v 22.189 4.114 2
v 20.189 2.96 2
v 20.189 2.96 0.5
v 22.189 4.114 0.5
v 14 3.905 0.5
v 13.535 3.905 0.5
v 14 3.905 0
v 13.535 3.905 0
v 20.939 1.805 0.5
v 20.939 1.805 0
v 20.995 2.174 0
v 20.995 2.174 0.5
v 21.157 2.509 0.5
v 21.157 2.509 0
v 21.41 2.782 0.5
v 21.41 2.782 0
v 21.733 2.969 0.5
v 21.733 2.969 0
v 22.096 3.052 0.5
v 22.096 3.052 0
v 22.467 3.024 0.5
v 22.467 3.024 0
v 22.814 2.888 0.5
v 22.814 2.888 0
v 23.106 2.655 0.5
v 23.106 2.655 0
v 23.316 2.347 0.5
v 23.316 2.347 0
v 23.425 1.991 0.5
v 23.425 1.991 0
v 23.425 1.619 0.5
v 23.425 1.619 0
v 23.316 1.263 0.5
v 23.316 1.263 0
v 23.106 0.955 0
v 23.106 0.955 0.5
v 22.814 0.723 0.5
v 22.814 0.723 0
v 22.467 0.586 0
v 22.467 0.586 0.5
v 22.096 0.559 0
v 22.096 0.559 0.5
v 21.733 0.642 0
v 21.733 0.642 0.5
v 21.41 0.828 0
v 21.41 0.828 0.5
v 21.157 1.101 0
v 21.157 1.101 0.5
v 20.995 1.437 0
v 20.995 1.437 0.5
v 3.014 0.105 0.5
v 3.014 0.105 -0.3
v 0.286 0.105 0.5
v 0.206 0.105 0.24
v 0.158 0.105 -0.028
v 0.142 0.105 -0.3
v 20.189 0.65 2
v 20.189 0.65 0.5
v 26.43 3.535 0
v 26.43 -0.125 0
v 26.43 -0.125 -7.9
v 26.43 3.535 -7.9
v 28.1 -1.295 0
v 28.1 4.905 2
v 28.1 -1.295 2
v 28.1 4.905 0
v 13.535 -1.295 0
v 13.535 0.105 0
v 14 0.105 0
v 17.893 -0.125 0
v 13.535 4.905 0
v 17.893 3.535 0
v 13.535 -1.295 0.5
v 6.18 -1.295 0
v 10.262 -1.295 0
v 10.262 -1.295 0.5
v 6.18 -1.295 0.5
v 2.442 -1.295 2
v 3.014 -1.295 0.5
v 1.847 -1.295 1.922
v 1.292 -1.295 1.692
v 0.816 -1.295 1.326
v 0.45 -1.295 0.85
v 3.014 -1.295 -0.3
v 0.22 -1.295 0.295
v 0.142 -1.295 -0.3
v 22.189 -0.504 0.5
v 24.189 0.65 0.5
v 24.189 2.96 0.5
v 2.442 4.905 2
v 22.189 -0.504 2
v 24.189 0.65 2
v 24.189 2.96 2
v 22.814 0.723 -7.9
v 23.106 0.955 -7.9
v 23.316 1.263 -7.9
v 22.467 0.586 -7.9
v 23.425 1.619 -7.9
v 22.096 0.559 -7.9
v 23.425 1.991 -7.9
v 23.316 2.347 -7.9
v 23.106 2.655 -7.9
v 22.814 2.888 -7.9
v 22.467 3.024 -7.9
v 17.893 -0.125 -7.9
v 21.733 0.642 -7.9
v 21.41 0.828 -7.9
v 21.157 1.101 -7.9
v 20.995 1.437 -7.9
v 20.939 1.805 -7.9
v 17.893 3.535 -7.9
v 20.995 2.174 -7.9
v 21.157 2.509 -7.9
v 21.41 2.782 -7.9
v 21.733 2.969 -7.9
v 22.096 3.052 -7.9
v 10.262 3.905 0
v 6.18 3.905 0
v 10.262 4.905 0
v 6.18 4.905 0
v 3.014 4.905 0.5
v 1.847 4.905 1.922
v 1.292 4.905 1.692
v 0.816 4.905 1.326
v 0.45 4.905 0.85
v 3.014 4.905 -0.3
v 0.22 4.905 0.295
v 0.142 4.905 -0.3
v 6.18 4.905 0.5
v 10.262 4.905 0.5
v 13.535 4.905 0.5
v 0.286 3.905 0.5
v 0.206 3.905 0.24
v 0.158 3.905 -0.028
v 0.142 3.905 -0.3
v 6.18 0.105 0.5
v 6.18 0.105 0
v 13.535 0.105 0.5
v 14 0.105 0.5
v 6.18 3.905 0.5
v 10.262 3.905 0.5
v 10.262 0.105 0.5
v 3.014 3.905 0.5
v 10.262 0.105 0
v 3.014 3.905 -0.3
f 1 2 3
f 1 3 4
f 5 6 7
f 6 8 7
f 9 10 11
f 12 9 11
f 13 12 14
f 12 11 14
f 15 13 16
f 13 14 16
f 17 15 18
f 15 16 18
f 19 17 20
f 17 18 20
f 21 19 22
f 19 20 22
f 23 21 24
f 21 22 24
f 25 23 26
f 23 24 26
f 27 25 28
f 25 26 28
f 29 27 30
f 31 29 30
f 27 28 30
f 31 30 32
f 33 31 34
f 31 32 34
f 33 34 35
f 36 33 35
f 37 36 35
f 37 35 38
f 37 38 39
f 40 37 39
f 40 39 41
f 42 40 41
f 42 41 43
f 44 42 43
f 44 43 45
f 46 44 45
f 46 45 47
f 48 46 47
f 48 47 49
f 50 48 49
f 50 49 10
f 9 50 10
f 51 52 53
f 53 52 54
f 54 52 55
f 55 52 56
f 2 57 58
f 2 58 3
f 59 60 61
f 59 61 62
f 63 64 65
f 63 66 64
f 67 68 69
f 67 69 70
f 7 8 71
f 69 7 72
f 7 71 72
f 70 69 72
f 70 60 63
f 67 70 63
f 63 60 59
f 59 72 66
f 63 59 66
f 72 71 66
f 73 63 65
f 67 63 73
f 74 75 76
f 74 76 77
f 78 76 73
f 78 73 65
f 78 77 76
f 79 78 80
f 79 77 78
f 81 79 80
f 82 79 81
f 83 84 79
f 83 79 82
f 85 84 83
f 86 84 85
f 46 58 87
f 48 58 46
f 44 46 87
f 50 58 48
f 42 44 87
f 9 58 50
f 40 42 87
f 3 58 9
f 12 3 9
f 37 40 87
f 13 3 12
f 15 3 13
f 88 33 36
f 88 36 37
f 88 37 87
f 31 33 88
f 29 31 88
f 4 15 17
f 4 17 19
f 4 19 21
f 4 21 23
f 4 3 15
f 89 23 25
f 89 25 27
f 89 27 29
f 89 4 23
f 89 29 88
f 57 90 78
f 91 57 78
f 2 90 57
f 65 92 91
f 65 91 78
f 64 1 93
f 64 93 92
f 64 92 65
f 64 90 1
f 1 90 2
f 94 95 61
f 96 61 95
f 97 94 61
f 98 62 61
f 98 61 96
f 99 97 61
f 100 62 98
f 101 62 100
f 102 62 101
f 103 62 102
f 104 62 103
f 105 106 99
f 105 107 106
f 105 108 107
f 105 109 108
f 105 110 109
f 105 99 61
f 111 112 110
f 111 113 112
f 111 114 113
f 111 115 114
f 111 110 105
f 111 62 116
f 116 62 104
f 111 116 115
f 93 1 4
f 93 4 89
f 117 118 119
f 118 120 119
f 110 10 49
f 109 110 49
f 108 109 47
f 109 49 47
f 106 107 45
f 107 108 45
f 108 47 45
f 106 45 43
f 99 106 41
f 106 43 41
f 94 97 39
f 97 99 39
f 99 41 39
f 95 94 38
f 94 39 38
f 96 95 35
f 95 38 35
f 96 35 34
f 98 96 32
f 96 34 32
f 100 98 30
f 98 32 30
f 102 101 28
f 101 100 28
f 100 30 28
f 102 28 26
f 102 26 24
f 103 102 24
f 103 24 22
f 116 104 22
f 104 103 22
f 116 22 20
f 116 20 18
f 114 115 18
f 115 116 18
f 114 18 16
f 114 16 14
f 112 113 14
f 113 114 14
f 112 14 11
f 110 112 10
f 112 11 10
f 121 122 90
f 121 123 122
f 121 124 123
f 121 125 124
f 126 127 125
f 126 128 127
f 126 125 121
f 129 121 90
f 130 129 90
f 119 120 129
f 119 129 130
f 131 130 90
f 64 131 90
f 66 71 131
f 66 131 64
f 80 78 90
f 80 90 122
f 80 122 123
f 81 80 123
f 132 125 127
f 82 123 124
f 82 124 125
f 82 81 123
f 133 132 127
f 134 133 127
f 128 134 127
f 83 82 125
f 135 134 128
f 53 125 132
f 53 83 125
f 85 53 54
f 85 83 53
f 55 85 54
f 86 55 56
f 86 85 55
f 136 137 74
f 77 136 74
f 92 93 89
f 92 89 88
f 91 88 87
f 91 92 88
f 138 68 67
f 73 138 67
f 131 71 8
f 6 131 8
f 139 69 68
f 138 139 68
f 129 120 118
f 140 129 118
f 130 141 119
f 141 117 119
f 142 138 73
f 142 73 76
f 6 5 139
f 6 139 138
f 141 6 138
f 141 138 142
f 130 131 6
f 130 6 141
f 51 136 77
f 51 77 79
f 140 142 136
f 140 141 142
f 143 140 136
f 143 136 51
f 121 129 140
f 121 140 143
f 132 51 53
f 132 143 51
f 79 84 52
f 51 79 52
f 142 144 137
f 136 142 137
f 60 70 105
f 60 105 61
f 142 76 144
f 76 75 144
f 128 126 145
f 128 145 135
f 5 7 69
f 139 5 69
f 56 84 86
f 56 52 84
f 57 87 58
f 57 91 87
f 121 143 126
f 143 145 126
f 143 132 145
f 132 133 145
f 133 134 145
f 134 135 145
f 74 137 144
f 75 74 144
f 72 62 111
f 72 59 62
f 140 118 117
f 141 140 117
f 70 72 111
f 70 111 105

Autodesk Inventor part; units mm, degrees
ref_plane "YZ Plane" through (0, 0, 0) normal (1, 0, 0) x (0, 1, 0)
ref_plane "XZ Plane" through (0, 0, 0) normal (0, 1, 0) x (-1, 0, 0)
ref_plane "XY Plane" through (0, 0, 0) normal (0, 0, 1) x (1, 0, 0)
sketch "Sketch1" plane through (0, 0, 0) normal (0, 0, 1) x (1, 0, 0)
  line L0 (0.142, 0.105) -> (28.1, 0.105)
  line L1 (28.1, -1.295) -> (0.142, -1.295)
  line L2 (0.142, -1.295) -> (0.142, 0.105)
  line L3 (28.1, -1.295) -> (28.1, 0.105)
  line L4 (0.142, -1.295) -> (0.142, 0.105)
  line L5 (10.2623, 4.905) -> (13.5348, 4.905) projected
  line L6 (6.1805, 3.905) -> (10.2623, 3.905) projected
  line L7 (10.2623, 0.105) -> (6.1805, 0.105) projected
  line L8 (0.142, 4.905) -> (28.1, 4.905)
  line L9 (28.1, 4.905) -> (28.1, 3.905)
  line L10 (28.1, 3.905) -> (0.142, 3.905)
  line L11 (0.142, 3.905) -> (0.142, 4.905)
  line L12 (0.142, -1.295) -> (0.142, 0.105)
  line L13 (28.1, 3.905) -> (28.1, 0.105)
  line L14 (0.142, 3.905) -> (0.142, 0.105)
  line L15 (3.1, -1.295) -> (29.6, -1.295) projected
  line L16 (0.142, -1.295) -> (0.142, 0.105) projected
extrude "side" add sketch "Sketch1" along normal blind 2
sketch "Sketch2" plane through (0, 0, 0) normal (0, 0, -1) x (-1, 0, 0)
  line L0 (-26.6, -0.295) -> (-17.7228, -0.295) projected
  circle A0 centre (-22.1893, 1.8051) radius 1.1 projected
  line L1 (-26.6, -0.295) -> (-17.7228, -0.295) projected
  line L2 (-26.6, 3.705) -> (-26.6, -0.295) projected
  line L3 (-17.7228, 3.705) -> (-26.6, 3.705) projected
  line L4 (-17.8928, -0.125) -> (-26.43, -0.125)
  line L5 (-26.43, -0.125) -> (-26.43, 3.535)
  line L6 (-26.43, 3.535) -> (-17.8928, 3.535)
  circle A1 centre (-22.1893, 1.8051) radius 1.25
  line L7 (-17.8928, 3.535) -> (-17.8928, -0.125)
  line L8 (-17.7228, -0.295) -> (-17.7228, 3.905) projected
  point P0 (0, 0)
  dimension "d2" = 0.17
  dimension "d4" = 0.17
  dimension "d5" = 0.17
  dimension "d6" = 2.5
  dimension "d25" = 0.17
extrude "sliding_block" add sketch "Sketch2" along normal blind 7.9 contours L4 L5 L6 L7
sketch "Sketch3" plane through (22.1893, 1.8051, 0) normal (0, 0, -1) x (-1, 0, 0)
  circle A0 centre (0, 0) radius 1.25 projected
  point P0 (22.1893, -1.8051)
extrude "hole" cut sketch "Sketch3" against normal up to surface (2 mm away)
sketch "Sketch4" plane through (0, 0, 0) normal (0, 0, -1) x (-1, 0, 0)
  line L0 (-3.0135, 4.905) -> (-6.1805, 4.905) projected
  line L1 (-3.0135, 3.905) -> (-3.0135, 4.905) projected
  line L2 (-0.3963, 3.905) -> (-3.0135, 3.905) projected
  line L3 (-3.0135, 0.105) -> (-0.3963, 0.105) projected
  line L4 (-3.0135, -1.295) -> (-3.0135, 0.105) projected
  line L5 (-6.1805, -1.295) -> (-3.0135, -1.295) projected
  line L6 (-6.1805, 0.105) -> (-6.1805, -1.295) projected
  line L7 (-10.2623, 0.105) -> (-6.1805, 0.105) projected
  line L8 (-10.2623, -1.295) -> (-10.2623, 0.105) projected
  line L9 (-13.5348, -1.295) -> (-10.2623, -1.295) projected
  line L10 (-13.5348, 0.105) -> (-13.5348, -1.295) projected
  line L11 (-14, 0.105) -> (-13.5348, 0.105) projected
  line L12 (-14, 3.905) -> (-14, 0.105) projected
  line L13 (-13.5348, 3.905) -> (-14, 3.905) projected
  line L14 (-13.5348, 4.905) -> (-13.5348, 3.905) projected
  line L15 (-10.2623, 4.905) -> (-13.5348, 4.905) projected
  line L16 (-10.2623, 3.905) -> (-10.2623, 4.905) projected
  line L17 (-6.1805, 3.905) -> (-10.2623, 3.905) projected
  line L18 (-6.1805, 4.905) -> (-6.1805, 3.905) projected
  line L19 (-6.1805, -1.295) -> (-3.0135, -1.295) projected
  line L20 (-6.1805, 0.105) -> (-6.1805, -1.295) projected
  line L21 (-10.2623, 0.105) -> (-6.1805, 0.105) projected
  line L22 (-10.2623, -1.295) -> (-10.2623, 0.105) projected
  line L23 (-13.5348, -1.295) -> (-10.2623, -1.295) projected
  line L24 (-13.5348, 0.105) -> (-13.5348, -1.295) projected
  line L25 (-14, 0.105) -> (-13.5348, 0.105) projected
  line L26 (-14, 3.905) -> (-14, 0.105) projected
  line L27 (-13.5348, 3.905) -> (-14, 3.905) projected
  line L28 (-13.5348, 4.905) -> (-13.5348, 3.905) projected
  line L29 (-10.2623, 4.905) -> (-13.5348, 4.905) projected
  line L30 (-10.2623, 3.905) -> (-10.2623, 4.905) projected
  line L31 (-6.1805, 3.905) -> (-10.2623, 3.905) projected
  line L32 (-6.1805, 4.905) -> (-6.1805, 3.905) projected
  line L33 (-3.0135, 4.905) -> (-6.1805, 4.905) projected
  line L34 (-3.0135, 3.905) -> (-3.0135, 4.905) projected
  line L35 (-0.3963, 3.905) -> (-3.0135, 3.905) projected
  line L36 (-0.3963, 0.105) -> (-0.3963, 3.905) projected
  line L37 (-3.0135, 0.105) -> (-0.3963, 0.105) projected
  line L38 (-3.0135, -1.295) -> (-3.0135, 0.105) projected
  line L39 (-0.3963, 0.105) -> (-0.142, 0.105)
  line L40 (-0.142, 4.905) -> (-0.142, -1.295) projected
  line L41 (-0.3963, 3.905) -> (-0.142, 3.905)
  line L42 (-0.142, 3.905) -> (-0.142, 0.105)
extrude "alignment_cut" cut sketch "Sketch4" against normal blind 0.5
sketch "Sketch5" plane through (0, 0, 2) normal (0, 0, 1) x (1, 0, 0)
  line L0 (22.1893, 4.1145) -> (24.1893, 2.9598)
  line L1 (24.1893, 2.9598) -> (24.1893, 0.6504)
  line L2 (24.1893, 0.6504) -> (22.1893, -0.5043)
  line L3 (22.1893, -0.5043) -> (20.1893, 0.6504)
  line L4 (20.1893, 0.6504) -> (20.1893, 2.9598)
  line L5 (20.1893, 2.9598) -> (22.1893, 4.1145)
  circle A0 centre (22.1893, 1.8051) radius 1.25 projected
  point P0 (0, 0)
  dimension "d19" = 4
sketch "Sketch6" plane through (0, 0, 0) normal (0, 0, -1) x (-1, 0, 0)
  line L0 (-0.142, -1.295) -> (-28.1, -1.295) projected
  line L1 (-0.142, -1.295) -> (-28.1, -1.295) projected
  line L2 (-28.1, 4.905) -> (-0.142, 4.905) projected
  line L3 (-28.1, 4.905) -> (-13.5348, 4.905) projected
  line L4 (-3.0135, 3.905) -> (-3.0135, 4.905) projected
  line L5 (-0.142, 4.905) -> (-3.0135, 4.905) projected
  line L6 (-0.142, 3.905) -> (-3.0135, 3.905) projected
  line L7 (-0.142, -1.295) -> (-3.0135, -1.295) projected
  line L8 (-13.5348, -1.295) -> (-13.5348, 0.105) projected
  line L9 (-13.5348, 0.105) -> (-14, 0.105) projected
  line L10 (-14, 0.105) -> (-14, 3.905) projected
  line L11 (-14, 3.905) -> (-13.5348, 3.905) projected
  line L12 (-13.5348, 3.905) -> (-13.5348, 4.905) projected
  line L13 (-13.5348, -1.295) -> (-28.1, -1.295) projected
  line L14 (-10.2623, 0.105) -> (-10.2623, -1.295) projected
  line L15 (-6.1805, -1.295) -> (-10.2623, -1.295) projected
  line L16 (-6.1805, -1.295) -> (-6.1805, 0.105) projected
  line L17 (-6.1805, 0.105) -> (-10.2623, 0.105) projected
  line L18 (-3.0135, 0.105) -> (-3.0135, -1.295) projected
  line L19 (-0.142, 4.905) -> (-0.142, 3.905) projected
  line L20 (-3.0135, 4.905) -> (-3.0135, 3.905) projected
  line L21 (-10.2623, 4.905) -> (-10.2623, 3.905) projected
  line L22 (-10.2623, 3.905) -> (-6.1805, 3.905) projected
  line L23 (-6.1805, 3.905) -> (-6.1805, 4.905) projected
  line L24 (-3.0135, 4.905) -> (-0.142, 4.905) projected
  line L25 (-10.2623, 4.905) -> (-6.1805, 4.905) projected
  line L26 (-28.1, -1.295) -> (-28.1, 4.905) projected
  line L27 (-26.43, 3.535) -> (-17.8928, 3.535) projected
  line L28 (-17.8928, 3.535) -> (-17.8928, -0.125) projected
  line L29 (-17.8928, -0.125) -> (-26.43, -0.125) projected
  line L30 (-26.43, -0.125) -> (-26.43, 3.535) projected
  line L31 (-0.142, 3.905) -> (-0.142, 4.905) projected
  line L32 (-0.142, 0.105) -> (-0.142, -1.295) projected
  line L33 (-0.142, 0.105) -> (-3.0135, 0.105) projected
  line L34 (-3.0135, 3.905) -> (-0.142, 3.905) projected
  point P0 (-0.1, 0.105)
  point P1 (-0.1, 3.905)
extrude "probe_slot" add sketch "Sketch6" along normal blind 0.3 contours L0 L18 L33 L32 | L2 L19 L6 L4
extrude "nut_slot" cut sketch "Sketch5" against normal blind 1.5 contours L0 L1 L2 L3 L4 L5 | A0
fillet "Fillet3" radius 2.3 1 edges at (0.142, 1.805, 2)
equation "\"d4\" = d2"
equation "\"d5\" = d2"
equation "\"d25\" = d2"
properties part number "stereotax_side"
